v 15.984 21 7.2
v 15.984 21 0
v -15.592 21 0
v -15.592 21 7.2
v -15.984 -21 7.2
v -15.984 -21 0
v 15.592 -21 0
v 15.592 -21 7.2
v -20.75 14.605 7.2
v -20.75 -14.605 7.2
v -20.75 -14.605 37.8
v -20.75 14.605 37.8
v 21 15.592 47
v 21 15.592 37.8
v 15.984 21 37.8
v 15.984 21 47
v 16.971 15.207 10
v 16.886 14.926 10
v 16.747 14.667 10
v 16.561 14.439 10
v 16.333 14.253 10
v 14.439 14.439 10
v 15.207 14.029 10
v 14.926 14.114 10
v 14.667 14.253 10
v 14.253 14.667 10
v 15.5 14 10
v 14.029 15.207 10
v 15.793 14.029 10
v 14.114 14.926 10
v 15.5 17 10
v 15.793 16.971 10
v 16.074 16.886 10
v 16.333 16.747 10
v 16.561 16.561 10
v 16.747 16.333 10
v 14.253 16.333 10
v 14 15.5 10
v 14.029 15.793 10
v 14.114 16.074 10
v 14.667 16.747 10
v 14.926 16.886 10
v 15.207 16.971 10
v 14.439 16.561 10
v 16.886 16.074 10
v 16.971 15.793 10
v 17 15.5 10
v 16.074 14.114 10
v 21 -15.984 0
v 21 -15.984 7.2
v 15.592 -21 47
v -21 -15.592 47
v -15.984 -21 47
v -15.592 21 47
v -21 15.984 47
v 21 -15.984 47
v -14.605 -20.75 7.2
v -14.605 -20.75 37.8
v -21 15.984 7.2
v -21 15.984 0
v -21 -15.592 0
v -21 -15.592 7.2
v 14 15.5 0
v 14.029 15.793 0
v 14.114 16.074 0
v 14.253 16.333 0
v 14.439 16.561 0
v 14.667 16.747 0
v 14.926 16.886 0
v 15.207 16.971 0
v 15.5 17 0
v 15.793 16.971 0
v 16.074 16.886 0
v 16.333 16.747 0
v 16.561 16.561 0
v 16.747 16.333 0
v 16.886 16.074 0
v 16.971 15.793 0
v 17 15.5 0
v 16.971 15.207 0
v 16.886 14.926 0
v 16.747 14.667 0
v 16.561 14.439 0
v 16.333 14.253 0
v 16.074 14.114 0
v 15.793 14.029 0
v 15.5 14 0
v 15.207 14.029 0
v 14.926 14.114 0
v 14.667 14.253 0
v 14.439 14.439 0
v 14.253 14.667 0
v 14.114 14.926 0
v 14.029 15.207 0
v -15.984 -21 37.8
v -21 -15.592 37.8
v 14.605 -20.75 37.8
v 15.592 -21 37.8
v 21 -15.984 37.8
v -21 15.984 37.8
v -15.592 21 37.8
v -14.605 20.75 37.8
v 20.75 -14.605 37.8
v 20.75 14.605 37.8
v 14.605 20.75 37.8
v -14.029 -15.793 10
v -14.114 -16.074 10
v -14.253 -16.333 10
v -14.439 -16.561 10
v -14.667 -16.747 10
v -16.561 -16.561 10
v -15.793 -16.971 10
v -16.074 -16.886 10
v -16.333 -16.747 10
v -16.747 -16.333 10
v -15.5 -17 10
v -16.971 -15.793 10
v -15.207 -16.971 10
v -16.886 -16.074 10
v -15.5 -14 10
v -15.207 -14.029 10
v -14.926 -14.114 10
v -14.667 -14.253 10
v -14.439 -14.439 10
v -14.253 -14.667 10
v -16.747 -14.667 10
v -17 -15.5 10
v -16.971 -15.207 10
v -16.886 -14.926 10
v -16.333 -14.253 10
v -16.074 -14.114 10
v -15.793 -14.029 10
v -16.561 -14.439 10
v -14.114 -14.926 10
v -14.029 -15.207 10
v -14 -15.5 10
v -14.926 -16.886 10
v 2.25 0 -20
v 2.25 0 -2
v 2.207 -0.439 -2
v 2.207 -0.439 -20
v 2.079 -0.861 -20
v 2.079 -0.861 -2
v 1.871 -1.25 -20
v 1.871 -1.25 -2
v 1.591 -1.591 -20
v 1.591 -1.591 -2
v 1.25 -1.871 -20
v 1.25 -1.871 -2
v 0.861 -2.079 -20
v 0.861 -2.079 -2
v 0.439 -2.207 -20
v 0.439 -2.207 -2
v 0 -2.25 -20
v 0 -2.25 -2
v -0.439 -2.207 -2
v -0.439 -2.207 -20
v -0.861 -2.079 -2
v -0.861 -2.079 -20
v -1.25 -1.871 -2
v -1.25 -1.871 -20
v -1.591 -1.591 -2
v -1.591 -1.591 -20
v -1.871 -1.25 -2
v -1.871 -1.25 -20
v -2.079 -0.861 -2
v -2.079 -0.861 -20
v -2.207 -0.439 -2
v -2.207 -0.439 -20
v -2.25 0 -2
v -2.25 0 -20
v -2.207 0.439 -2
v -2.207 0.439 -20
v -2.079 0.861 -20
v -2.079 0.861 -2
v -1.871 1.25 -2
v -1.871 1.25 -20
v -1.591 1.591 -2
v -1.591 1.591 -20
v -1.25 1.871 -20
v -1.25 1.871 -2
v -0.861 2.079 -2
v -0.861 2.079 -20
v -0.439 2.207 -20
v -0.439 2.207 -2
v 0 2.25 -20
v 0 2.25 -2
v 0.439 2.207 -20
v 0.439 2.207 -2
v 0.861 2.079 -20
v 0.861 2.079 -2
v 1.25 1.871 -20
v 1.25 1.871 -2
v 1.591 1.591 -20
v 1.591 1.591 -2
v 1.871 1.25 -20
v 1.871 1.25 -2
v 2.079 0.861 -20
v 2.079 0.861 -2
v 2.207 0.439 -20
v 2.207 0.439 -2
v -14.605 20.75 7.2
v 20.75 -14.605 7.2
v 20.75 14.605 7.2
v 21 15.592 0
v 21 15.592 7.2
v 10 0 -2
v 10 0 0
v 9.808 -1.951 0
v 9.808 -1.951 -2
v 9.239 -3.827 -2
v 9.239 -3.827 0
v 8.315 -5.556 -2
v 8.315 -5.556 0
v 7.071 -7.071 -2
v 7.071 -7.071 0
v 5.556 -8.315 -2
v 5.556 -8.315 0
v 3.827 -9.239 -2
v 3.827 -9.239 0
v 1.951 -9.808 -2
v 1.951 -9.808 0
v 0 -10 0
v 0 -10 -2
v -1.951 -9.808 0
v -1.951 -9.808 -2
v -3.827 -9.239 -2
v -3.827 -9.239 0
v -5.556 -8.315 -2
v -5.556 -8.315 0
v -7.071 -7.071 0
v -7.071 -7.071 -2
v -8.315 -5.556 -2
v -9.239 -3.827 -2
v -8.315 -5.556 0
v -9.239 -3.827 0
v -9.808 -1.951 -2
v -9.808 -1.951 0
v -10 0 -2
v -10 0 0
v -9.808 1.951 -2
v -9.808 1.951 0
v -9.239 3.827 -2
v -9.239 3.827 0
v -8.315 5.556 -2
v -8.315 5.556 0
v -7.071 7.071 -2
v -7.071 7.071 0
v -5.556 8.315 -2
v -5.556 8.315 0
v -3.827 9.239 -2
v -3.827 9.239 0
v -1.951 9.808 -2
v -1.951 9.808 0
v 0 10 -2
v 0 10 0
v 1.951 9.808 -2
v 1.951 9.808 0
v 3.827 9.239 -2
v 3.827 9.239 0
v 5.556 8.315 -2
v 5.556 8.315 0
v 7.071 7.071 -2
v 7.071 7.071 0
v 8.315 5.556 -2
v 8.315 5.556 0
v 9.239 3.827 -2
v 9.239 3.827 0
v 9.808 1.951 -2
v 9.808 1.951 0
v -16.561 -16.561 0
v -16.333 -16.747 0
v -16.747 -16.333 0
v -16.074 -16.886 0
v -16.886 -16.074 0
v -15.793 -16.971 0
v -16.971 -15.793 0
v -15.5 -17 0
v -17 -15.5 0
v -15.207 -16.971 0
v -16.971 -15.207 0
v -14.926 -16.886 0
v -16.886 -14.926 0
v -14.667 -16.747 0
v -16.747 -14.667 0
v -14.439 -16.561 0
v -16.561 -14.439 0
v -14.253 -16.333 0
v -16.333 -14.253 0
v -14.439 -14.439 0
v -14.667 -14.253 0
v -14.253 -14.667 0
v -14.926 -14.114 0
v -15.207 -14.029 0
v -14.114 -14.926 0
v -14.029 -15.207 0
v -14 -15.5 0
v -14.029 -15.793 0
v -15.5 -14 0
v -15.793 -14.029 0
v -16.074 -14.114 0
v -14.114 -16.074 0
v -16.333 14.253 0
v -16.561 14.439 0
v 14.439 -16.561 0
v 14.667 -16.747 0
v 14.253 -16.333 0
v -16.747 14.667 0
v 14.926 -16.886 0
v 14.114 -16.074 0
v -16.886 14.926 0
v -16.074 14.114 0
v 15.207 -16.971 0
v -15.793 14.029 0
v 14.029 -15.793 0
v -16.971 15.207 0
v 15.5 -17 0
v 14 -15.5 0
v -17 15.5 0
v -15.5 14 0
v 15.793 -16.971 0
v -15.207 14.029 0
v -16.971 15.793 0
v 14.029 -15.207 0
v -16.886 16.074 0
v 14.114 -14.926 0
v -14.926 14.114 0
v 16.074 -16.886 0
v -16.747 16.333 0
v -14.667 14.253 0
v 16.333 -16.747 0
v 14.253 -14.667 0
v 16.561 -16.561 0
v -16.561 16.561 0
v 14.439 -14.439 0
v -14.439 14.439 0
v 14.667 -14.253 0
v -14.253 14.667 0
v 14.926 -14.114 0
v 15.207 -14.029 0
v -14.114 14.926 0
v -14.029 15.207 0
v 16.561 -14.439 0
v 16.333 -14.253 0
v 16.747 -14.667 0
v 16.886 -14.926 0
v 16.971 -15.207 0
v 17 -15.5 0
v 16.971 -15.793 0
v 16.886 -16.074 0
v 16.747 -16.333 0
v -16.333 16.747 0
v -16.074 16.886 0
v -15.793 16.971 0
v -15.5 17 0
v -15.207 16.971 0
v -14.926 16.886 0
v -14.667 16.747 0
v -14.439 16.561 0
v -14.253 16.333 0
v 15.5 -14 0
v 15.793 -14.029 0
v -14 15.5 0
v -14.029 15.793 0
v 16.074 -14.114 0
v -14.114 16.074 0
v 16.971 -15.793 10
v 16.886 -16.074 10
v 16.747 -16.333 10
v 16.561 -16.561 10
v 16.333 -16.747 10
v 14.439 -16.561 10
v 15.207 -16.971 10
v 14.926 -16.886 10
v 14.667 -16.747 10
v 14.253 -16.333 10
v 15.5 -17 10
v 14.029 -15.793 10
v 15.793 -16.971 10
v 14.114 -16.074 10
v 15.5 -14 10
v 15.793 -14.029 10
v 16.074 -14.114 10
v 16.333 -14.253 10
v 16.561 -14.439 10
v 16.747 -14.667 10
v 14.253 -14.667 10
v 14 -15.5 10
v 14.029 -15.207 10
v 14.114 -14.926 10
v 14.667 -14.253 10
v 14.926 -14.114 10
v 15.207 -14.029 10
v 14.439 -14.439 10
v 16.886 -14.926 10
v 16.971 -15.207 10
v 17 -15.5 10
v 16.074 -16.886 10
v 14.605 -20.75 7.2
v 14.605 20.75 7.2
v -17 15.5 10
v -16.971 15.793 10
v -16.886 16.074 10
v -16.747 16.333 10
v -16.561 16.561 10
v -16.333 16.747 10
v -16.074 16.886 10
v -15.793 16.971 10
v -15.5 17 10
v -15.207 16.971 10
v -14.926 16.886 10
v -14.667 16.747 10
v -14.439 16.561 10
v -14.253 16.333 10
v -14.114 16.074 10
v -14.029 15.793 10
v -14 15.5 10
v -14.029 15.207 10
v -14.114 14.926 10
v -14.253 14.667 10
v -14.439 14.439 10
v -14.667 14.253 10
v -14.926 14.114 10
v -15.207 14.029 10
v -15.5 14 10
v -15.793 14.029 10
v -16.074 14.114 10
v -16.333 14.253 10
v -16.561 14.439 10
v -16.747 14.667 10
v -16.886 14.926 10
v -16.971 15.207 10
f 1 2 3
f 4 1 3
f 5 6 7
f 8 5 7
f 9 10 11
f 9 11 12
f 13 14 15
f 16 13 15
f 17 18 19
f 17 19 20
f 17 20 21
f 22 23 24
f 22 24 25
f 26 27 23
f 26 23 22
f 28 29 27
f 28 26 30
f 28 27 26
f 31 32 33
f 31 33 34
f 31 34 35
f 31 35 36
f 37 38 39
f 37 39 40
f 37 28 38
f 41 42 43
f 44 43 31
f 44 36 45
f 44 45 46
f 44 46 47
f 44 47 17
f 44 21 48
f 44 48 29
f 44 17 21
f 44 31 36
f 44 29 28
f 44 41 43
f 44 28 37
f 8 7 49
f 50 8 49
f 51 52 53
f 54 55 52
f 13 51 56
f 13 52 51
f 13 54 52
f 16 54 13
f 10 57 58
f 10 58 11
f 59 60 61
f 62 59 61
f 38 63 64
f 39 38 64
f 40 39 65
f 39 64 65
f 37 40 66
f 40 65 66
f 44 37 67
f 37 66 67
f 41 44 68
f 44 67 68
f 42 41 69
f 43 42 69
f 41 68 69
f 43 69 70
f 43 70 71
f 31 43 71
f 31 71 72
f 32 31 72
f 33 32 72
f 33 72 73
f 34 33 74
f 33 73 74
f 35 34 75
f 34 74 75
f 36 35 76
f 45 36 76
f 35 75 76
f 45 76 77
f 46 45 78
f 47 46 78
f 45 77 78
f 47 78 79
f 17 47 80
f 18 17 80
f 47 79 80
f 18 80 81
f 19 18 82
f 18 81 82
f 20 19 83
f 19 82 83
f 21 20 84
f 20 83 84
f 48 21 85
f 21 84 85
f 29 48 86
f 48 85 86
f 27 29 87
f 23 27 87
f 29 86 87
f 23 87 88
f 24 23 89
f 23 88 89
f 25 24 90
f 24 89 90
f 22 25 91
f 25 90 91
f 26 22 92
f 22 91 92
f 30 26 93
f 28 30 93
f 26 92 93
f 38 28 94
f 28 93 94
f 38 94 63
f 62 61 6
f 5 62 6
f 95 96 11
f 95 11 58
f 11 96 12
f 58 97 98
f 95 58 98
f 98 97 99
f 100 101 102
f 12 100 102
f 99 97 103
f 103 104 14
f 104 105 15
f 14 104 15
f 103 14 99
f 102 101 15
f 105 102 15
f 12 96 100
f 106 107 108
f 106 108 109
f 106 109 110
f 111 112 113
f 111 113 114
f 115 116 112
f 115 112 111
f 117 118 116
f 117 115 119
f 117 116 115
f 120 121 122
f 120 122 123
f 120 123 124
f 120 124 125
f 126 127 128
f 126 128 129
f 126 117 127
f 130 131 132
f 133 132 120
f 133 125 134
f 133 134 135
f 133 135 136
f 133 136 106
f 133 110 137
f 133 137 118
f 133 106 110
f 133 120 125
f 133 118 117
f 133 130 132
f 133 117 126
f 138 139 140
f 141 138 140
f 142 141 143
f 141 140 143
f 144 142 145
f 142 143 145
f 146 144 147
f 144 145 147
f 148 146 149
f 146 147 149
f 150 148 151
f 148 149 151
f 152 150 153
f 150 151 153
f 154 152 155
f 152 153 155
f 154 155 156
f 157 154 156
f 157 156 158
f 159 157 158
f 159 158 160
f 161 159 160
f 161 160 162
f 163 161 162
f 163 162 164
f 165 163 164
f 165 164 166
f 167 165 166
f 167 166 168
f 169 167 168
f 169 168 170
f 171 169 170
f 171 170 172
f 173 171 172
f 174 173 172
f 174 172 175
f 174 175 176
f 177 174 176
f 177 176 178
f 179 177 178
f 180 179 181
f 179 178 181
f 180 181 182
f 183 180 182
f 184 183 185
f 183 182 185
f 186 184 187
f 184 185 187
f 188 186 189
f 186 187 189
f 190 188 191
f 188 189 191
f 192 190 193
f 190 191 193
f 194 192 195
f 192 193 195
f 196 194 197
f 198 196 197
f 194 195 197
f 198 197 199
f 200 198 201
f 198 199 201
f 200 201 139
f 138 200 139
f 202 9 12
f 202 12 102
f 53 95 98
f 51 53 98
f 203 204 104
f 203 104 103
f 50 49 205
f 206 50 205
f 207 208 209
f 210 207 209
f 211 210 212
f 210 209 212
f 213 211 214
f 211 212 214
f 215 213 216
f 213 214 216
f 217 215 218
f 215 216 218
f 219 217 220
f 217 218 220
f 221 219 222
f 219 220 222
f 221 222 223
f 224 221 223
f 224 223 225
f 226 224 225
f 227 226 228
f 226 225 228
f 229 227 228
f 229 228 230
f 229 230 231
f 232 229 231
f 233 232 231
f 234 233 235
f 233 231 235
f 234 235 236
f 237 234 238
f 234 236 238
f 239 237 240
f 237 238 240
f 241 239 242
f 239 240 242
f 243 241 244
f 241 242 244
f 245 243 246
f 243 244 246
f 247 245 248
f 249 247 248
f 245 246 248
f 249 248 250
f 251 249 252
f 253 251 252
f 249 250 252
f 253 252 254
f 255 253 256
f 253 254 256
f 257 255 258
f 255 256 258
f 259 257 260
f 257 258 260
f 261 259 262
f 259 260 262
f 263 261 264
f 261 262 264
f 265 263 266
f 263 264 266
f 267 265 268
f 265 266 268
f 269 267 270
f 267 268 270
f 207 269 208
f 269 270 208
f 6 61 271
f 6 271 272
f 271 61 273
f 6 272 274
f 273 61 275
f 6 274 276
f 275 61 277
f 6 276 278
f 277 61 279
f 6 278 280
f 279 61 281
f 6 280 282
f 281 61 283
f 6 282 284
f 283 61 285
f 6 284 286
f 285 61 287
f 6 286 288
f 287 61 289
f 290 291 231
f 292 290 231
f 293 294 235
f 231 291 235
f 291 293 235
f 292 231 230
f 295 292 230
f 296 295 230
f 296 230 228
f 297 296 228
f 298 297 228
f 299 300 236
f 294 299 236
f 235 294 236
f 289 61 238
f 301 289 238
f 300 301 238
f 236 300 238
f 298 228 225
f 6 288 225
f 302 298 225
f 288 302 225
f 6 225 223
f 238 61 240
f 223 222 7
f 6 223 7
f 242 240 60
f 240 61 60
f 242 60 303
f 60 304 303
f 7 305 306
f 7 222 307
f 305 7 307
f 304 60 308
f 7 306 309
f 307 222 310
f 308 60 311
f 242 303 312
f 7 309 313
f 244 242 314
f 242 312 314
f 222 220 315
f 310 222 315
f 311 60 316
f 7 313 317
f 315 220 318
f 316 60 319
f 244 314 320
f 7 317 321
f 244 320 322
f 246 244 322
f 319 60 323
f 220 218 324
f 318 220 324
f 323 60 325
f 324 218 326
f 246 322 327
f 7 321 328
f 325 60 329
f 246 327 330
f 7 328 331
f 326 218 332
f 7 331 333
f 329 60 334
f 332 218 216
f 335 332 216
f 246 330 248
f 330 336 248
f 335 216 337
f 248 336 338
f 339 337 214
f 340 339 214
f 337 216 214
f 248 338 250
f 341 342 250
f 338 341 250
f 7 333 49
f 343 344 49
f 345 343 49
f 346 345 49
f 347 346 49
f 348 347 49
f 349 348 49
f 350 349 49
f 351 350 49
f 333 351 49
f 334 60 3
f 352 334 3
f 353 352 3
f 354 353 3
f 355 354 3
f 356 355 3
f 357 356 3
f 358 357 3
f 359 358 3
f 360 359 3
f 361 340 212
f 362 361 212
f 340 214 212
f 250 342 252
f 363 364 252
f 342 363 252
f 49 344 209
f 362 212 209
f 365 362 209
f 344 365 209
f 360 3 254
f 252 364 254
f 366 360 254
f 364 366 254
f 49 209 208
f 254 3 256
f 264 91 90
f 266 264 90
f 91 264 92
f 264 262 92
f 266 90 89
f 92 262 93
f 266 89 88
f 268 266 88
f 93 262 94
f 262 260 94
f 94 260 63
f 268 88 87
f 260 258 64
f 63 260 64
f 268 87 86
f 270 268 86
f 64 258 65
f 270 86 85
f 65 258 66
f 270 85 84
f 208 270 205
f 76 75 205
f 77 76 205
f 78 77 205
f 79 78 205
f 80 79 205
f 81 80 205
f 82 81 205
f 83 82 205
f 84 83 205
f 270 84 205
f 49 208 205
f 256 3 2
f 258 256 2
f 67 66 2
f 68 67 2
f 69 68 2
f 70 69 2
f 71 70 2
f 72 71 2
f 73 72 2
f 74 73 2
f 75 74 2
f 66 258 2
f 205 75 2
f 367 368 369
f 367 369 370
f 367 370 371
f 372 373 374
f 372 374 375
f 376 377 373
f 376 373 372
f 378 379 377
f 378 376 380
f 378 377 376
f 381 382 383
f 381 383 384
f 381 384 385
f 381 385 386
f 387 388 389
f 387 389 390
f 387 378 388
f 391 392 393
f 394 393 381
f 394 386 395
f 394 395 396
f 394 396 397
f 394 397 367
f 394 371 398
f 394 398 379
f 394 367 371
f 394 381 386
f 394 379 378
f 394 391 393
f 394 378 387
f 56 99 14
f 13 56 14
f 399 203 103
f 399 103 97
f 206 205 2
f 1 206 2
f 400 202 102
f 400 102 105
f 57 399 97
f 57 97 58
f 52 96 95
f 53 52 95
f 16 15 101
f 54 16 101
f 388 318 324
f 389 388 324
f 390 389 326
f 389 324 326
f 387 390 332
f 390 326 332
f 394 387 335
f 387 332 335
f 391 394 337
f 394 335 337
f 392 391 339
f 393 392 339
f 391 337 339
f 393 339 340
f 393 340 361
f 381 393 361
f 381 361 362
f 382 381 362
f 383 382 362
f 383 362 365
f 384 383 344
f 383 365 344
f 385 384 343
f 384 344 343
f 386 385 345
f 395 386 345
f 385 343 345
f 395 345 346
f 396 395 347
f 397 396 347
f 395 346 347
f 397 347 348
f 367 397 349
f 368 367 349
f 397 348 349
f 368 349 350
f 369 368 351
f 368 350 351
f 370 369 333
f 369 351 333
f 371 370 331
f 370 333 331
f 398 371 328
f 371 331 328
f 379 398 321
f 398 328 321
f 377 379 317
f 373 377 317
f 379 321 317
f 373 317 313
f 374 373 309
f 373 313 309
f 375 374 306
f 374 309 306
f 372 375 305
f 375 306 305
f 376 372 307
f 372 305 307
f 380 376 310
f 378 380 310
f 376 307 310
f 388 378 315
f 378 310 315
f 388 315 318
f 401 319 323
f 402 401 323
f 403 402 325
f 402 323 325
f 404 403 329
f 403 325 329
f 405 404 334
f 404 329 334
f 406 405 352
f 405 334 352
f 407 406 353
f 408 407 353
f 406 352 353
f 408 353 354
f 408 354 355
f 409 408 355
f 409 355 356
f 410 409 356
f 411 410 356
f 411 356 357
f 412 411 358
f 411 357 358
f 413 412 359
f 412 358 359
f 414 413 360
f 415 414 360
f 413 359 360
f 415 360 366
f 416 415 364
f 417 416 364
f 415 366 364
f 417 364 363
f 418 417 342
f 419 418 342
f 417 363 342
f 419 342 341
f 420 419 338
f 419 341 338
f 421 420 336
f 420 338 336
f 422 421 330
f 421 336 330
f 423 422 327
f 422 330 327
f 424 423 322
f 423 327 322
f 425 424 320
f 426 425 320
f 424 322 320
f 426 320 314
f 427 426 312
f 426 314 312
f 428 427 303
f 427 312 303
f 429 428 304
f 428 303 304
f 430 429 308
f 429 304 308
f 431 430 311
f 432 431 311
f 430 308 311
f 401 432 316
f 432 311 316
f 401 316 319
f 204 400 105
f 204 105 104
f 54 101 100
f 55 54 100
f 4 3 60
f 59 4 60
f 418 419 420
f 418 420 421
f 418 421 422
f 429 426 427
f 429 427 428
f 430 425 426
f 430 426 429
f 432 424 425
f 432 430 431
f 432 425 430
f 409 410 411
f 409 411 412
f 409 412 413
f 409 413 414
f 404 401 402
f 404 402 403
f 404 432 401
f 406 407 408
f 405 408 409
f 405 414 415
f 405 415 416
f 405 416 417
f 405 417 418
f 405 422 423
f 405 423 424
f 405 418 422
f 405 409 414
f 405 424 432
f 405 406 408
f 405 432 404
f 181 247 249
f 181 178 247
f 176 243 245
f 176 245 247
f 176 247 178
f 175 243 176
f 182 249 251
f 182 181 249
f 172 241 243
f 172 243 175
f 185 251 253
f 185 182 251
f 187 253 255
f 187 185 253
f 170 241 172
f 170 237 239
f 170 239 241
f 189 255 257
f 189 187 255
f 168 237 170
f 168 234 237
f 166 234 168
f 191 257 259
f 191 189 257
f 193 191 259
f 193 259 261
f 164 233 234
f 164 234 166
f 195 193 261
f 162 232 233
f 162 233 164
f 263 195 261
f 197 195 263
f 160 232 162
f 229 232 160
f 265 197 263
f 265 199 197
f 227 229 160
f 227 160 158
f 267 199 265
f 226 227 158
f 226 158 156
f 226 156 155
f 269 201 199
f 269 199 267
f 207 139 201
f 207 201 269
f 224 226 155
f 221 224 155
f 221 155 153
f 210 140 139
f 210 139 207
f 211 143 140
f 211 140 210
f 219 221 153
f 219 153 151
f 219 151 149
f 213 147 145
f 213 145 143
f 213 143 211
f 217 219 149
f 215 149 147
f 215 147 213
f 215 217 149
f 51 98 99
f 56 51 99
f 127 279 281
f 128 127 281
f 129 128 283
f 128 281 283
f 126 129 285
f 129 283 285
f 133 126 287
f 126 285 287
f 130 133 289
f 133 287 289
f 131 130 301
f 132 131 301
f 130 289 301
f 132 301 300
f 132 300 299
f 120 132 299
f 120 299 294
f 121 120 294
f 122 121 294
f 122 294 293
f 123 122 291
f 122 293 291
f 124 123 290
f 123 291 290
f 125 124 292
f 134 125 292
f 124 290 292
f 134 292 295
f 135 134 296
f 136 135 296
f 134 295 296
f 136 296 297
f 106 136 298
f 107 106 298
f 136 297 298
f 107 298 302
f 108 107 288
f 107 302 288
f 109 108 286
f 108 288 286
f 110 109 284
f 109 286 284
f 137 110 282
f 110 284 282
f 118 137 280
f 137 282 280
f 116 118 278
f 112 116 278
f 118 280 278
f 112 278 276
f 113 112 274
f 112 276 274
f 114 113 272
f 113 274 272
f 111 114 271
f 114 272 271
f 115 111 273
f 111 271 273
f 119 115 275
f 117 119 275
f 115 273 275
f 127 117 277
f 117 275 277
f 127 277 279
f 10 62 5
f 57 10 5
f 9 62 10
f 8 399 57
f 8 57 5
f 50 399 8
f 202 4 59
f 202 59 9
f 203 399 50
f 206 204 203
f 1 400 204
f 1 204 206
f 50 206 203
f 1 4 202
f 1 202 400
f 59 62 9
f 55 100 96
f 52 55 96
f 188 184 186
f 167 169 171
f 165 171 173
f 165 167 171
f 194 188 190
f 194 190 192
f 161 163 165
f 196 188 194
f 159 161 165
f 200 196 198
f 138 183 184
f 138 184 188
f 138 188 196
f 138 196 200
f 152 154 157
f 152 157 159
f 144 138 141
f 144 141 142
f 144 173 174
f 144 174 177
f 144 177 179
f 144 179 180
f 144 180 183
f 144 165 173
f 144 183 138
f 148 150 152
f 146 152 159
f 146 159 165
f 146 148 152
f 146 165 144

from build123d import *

# Parameters (mm, degrees)
RESSALTO_EXTRUS_O1_DEPTH   = 47
CORTE_EXTRUS_O_FINA1_START = -39.8
CORTE_EXTRUS_O_FINA1_DEPTH = 30.6
ESBO_O3_R                  = 2.25
RESSALTO_EXTRUS_O2_DEPTH   = 20
ESBO_O4_R                  = 10
RESSALTO_EXTRUS_O3_DEPTH   = 2
ESBO_O5_R                  = 1.5
CORTE_EXTRUS_O1_DEPTH      = 10


# Read off the part's stored shape, not the designer's step: Corte-Extrusão-Fina1
with BuildPart() as part:
    # Esboço1 → Ressalto-extrusão1 (new body)
    with BuildSketch(Plane.XY):
        Polygon((-21, -15.592171873), (-15.984175996, -21), (15.592171873, -21), (21, -15.984175996), (21, 15.592171873), (15.984175996, 21), (-15.592171873, 21), (-21, 15.984175996), align=None)
    extrude(amount=RESSALTO_EXTRUS_O1_DEPTH)

    # Corte-Extrusão-Fina1 outline → Corte-Extrusão-Fina1 (cut)
    with BuildSketch(Plane.XY.offset(47).offset(CORTE_EXTRUS_O_FINA1_START)):
        Polygon((15.592171873, -21), (21, -15.984175996), (21, 15.592171873), (15.984175996, 21), (-15.592171873, 21), (-21, 15.984175996), (-21, -15.592171873), (-15.984175996, -21), align=None)
        Polygon((14.605339059, 20.75), (20.75, 14.605339059), (20.75, -14.605339059), (14.605339059, -20.75), (-14.605339059, -20.75), (-20.75, -14.605339059), (-20.75, 14.605339059), (-14.605339059, 20.75), align=None, mode=Mode.SUBTRACT)
    extrude(amount=CORTE_EXTRUS_O_FINA1_DEPTH, mode=Mode.SUBTRACT)

    # Esboço3 → Ressalto-extrusão2 (add)
    with BuildSketch(Plane(origin=(0, 0, 0), x_dir=(-1, 0, 0), z_dir=(0, 0, -1))):
        with Locations(Location((0, 0, 0), (0, 0, 180))):
            Circle(ESBO_O3_R)
    extrude(amount=RESSALTO_EXTRUS_O2_DEPTH)

    # Esboço4 → Ressalto-extrusão3 (add)
    with BuildSketch(Plane(origin=(0, 0, 0), x_dir=(-1, 0, 0), z_dir=(0, 0, -1))):
        with Locations(Location((0, 0, 0), (0, 0, 180))):
            Circle(ESBO_O4_R)
    extrude(amount=RESSALTO_EXTRUS_O3_DEPTH)

    # Esboço5 → Corte-extrusão1 (cut)
    with BuildSketch(Plane(origin=(0, 0, 0), x_dir=(-1, 0, 0), z_dir=(0, 0, -1))):
        with Locations((15.5, -15.5)):
            Circle(ESBO_O5_R)
        with Locations((-15.5, -15.5)):
            Circle(ESBO_O5_R)
        with Locations((-15.5, 15.5)):
            Circle(ESBO_O5_R)
        with Locations((15.5, 15.5)):
            Circle(ESBO_O5_R)
    extrude(amount=-CORTE_EXTRUS_O1_DEPTH, mode=Mode.SUBTRACT)


solid = part.part
